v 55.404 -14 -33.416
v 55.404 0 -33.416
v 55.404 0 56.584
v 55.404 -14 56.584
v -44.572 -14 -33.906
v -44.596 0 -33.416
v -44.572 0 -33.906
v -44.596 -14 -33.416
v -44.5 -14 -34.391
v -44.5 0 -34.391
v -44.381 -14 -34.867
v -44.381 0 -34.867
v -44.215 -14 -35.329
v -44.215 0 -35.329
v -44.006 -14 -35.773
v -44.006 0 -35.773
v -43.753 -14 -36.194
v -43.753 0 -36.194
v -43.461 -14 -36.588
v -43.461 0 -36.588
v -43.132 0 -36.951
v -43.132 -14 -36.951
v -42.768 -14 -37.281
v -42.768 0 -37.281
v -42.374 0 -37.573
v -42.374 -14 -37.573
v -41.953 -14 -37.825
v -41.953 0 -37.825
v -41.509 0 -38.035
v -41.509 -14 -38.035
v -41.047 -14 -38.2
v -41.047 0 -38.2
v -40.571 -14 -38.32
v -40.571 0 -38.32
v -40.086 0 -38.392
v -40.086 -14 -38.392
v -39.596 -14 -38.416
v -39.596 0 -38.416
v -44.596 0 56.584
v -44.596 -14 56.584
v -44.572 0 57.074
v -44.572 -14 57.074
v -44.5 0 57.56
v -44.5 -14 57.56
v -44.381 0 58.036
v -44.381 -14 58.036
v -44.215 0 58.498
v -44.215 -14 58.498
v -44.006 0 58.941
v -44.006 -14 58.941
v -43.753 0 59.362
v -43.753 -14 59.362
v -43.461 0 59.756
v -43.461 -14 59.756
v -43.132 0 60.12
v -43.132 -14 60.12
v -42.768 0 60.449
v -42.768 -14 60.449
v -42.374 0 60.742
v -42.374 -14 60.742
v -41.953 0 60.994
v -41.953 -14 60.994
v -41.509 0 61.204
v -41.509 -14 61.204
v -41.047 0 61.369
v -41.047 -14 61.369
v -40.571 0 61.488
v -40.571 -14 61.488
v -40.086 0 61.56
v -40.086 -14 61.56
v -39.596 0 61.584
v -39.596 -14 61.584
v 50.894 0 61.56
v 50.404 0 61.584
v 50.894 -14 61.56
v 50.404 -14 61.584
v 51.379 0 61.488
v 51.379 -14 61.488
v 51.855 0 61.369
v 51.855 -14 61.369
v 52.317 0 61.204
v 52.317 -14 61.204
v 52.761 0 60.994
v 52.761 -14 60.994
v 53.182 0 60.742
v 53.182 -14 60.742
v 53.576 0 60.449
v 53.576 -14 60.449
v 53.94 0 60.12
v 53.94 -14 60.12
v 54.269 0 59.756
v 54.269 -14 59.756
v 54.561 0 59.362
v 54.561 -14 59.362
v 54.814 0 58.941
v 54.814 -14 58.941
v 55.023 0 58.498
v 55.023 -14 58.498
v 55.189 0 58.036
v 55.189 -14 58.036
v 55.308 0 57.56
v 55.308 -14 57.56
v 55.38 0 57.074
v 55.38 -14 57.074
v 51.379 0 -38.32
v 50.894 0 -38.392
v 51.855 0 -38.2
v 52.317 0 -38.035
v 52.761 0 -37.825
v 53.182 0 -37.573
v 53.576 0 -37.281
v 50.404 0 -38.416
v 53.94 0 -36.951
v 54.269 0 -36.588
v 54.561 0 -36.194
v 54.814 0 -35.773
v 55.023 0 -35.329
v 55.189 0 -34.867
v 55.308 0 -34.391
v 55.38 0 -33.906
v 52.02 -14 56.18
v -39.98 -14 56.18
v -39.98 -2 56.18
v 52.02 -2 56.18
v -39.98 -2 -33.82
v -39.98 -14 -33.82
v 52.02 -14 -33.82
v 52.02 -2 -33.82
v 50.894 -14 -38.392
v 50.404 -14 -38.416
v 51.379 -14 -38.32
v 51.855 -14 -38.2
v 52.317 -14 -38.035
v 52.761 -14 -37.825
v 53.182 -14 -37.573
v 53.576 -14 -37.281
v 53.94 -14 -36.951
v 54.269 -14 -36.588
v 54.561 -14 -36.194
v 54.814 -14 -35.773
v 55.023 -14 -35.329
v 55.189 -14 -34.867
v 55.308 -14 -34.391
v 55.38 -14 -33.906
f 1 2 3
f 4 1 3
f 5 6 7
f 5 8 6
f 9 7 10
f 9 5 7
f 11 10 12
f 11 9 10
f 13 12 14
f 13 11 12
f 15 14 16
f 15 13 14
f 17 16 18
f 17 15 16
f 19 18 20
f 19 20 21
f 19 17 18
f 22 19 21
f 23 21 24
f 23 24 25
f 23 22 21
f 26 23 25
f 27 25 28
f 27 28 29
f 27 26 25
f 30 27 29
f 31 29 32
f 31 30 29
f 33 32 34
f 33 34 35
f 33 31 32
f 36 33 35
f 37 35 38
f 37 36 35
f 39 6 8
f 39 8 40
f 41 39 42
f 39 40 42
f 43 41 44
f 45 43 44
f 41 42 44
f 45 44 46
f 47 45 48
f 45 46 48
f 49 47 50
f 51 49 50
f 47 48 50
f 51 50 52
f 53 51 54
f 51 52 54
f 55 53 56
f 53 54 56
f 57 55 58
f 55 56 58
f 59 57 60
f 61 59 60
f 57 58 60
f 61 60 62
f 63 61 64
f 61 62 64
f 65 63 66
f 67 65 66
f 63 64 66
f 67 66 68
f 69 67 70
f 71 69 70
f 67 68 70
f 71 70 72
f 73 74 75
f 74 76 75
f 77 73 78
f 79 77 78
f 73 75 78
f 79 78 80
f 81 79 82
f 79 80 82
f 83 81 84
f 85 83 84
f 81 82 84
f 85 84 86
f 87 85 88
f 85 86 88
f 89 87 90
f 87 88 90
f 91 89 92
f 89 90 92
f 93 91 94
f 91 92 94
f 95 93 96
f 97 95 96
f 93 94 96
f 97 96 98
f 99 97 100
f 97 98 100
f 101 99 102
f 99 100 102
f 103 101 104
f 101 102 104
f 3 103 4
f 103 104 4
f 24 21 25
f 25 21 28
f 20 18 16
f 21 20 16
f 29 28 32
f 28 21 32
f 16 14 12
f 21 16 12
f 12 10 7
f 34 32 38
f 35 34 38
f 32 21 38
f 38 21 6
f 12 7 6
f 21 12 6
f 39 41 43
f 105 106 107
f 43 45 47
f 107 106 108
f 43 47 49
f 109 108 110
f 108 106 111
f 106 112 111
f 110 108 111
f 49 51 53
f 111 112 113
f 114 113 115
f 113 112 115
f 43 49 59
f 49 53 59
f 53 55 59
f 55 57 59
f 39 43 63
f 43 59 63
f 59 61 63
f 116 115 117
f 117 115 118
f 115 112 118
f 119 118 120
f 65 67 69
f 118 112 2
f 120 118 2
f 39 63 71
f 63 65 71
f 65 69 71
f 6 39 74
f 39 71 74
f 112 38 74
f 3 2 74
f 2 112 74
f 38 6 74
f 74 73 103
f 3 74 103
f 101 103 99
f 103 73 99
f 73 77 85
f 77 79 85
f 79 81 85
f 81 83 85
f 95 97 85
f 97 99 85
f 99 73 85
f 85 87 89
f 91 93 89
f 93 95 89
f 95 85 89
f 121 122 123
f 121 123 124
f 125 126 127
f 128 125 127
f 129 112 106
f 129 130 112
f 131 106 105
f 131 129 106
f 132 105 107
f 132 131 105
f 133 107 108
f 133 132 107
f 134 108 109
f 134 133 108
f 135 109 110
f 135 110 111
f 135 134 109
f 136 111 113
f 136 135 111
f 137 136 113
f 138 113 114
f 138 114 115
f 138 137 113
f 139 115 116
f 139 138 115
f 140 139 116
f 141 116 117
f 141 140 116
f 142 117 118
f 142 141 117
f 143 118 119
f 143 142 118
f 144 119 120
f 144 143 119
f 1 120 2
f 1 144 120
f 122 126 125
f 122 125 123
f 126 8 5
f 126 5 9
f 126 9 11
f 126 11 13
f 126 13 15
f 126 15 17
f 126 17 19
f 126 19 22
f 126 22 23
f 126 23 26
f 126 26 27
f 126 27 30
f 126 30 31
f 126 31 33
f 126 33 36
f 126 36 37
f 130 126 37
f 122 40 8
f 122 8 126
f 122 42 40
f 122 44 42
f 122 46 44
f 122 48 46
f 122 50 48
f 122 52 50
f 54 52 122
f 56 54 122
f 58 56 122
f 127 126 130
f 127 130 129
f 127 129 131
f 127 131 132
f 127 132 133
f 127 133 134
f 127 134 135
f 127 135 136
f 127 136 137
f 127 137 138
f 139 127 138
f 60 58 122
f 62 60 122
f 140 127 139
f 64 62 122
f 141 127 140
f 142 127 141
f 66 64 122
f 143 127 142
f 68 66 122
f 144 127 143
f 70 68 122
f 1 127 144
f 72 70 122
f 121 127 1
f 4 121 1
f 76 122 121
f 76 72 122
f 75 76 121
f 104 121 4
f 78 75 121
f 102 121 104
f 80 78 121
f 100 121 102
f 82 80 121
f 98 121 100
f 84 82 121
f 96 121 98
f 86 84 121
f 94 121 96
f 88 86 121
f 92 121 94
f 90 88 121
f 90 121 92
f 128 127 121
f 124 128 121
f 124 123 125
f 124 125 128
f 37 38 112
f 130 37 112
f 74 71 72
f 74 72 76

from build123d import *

# Parameters (mm, degrees)
F0_W     = 100
F0_H     = 100
F1_DEPTH = 14
F2_W     = 92
F2_H     = 90
F3_DEPTH = 12
F4_R     = 5


with BuildPart() as f1:
    # F0 (on Front) → F1 (new body)
    with BuildSketch(Plane.XZ):
        with Locations((5.404, 11.584203)):
            Rectangle(F0_W, F0_H)
    extrude(amount=F1_DEPTH)

    # F2 (on face) → F3 (cut)
    with BuildSketch(Plane.XZ.offset(14)):
        with Locations((6.02, 11.180203)):
            Rectangle(F2_W, F2_H)
    extrude(amount=-F3_DEPTH, mode=Mode.SUBTRACT)

    # F4
    f4_edges = [f1.edges().sort_by_distance(p)[0] for p in [
        (-44.596, -7, -38.415797),
        (55.404, -7, -38.415797),
        (55.404, -7, 61.584203),
        (-44.596, -7, 61.584203),
    ]]
    fillet(f4_edges, radius=F4_R)


solid = f1.part
